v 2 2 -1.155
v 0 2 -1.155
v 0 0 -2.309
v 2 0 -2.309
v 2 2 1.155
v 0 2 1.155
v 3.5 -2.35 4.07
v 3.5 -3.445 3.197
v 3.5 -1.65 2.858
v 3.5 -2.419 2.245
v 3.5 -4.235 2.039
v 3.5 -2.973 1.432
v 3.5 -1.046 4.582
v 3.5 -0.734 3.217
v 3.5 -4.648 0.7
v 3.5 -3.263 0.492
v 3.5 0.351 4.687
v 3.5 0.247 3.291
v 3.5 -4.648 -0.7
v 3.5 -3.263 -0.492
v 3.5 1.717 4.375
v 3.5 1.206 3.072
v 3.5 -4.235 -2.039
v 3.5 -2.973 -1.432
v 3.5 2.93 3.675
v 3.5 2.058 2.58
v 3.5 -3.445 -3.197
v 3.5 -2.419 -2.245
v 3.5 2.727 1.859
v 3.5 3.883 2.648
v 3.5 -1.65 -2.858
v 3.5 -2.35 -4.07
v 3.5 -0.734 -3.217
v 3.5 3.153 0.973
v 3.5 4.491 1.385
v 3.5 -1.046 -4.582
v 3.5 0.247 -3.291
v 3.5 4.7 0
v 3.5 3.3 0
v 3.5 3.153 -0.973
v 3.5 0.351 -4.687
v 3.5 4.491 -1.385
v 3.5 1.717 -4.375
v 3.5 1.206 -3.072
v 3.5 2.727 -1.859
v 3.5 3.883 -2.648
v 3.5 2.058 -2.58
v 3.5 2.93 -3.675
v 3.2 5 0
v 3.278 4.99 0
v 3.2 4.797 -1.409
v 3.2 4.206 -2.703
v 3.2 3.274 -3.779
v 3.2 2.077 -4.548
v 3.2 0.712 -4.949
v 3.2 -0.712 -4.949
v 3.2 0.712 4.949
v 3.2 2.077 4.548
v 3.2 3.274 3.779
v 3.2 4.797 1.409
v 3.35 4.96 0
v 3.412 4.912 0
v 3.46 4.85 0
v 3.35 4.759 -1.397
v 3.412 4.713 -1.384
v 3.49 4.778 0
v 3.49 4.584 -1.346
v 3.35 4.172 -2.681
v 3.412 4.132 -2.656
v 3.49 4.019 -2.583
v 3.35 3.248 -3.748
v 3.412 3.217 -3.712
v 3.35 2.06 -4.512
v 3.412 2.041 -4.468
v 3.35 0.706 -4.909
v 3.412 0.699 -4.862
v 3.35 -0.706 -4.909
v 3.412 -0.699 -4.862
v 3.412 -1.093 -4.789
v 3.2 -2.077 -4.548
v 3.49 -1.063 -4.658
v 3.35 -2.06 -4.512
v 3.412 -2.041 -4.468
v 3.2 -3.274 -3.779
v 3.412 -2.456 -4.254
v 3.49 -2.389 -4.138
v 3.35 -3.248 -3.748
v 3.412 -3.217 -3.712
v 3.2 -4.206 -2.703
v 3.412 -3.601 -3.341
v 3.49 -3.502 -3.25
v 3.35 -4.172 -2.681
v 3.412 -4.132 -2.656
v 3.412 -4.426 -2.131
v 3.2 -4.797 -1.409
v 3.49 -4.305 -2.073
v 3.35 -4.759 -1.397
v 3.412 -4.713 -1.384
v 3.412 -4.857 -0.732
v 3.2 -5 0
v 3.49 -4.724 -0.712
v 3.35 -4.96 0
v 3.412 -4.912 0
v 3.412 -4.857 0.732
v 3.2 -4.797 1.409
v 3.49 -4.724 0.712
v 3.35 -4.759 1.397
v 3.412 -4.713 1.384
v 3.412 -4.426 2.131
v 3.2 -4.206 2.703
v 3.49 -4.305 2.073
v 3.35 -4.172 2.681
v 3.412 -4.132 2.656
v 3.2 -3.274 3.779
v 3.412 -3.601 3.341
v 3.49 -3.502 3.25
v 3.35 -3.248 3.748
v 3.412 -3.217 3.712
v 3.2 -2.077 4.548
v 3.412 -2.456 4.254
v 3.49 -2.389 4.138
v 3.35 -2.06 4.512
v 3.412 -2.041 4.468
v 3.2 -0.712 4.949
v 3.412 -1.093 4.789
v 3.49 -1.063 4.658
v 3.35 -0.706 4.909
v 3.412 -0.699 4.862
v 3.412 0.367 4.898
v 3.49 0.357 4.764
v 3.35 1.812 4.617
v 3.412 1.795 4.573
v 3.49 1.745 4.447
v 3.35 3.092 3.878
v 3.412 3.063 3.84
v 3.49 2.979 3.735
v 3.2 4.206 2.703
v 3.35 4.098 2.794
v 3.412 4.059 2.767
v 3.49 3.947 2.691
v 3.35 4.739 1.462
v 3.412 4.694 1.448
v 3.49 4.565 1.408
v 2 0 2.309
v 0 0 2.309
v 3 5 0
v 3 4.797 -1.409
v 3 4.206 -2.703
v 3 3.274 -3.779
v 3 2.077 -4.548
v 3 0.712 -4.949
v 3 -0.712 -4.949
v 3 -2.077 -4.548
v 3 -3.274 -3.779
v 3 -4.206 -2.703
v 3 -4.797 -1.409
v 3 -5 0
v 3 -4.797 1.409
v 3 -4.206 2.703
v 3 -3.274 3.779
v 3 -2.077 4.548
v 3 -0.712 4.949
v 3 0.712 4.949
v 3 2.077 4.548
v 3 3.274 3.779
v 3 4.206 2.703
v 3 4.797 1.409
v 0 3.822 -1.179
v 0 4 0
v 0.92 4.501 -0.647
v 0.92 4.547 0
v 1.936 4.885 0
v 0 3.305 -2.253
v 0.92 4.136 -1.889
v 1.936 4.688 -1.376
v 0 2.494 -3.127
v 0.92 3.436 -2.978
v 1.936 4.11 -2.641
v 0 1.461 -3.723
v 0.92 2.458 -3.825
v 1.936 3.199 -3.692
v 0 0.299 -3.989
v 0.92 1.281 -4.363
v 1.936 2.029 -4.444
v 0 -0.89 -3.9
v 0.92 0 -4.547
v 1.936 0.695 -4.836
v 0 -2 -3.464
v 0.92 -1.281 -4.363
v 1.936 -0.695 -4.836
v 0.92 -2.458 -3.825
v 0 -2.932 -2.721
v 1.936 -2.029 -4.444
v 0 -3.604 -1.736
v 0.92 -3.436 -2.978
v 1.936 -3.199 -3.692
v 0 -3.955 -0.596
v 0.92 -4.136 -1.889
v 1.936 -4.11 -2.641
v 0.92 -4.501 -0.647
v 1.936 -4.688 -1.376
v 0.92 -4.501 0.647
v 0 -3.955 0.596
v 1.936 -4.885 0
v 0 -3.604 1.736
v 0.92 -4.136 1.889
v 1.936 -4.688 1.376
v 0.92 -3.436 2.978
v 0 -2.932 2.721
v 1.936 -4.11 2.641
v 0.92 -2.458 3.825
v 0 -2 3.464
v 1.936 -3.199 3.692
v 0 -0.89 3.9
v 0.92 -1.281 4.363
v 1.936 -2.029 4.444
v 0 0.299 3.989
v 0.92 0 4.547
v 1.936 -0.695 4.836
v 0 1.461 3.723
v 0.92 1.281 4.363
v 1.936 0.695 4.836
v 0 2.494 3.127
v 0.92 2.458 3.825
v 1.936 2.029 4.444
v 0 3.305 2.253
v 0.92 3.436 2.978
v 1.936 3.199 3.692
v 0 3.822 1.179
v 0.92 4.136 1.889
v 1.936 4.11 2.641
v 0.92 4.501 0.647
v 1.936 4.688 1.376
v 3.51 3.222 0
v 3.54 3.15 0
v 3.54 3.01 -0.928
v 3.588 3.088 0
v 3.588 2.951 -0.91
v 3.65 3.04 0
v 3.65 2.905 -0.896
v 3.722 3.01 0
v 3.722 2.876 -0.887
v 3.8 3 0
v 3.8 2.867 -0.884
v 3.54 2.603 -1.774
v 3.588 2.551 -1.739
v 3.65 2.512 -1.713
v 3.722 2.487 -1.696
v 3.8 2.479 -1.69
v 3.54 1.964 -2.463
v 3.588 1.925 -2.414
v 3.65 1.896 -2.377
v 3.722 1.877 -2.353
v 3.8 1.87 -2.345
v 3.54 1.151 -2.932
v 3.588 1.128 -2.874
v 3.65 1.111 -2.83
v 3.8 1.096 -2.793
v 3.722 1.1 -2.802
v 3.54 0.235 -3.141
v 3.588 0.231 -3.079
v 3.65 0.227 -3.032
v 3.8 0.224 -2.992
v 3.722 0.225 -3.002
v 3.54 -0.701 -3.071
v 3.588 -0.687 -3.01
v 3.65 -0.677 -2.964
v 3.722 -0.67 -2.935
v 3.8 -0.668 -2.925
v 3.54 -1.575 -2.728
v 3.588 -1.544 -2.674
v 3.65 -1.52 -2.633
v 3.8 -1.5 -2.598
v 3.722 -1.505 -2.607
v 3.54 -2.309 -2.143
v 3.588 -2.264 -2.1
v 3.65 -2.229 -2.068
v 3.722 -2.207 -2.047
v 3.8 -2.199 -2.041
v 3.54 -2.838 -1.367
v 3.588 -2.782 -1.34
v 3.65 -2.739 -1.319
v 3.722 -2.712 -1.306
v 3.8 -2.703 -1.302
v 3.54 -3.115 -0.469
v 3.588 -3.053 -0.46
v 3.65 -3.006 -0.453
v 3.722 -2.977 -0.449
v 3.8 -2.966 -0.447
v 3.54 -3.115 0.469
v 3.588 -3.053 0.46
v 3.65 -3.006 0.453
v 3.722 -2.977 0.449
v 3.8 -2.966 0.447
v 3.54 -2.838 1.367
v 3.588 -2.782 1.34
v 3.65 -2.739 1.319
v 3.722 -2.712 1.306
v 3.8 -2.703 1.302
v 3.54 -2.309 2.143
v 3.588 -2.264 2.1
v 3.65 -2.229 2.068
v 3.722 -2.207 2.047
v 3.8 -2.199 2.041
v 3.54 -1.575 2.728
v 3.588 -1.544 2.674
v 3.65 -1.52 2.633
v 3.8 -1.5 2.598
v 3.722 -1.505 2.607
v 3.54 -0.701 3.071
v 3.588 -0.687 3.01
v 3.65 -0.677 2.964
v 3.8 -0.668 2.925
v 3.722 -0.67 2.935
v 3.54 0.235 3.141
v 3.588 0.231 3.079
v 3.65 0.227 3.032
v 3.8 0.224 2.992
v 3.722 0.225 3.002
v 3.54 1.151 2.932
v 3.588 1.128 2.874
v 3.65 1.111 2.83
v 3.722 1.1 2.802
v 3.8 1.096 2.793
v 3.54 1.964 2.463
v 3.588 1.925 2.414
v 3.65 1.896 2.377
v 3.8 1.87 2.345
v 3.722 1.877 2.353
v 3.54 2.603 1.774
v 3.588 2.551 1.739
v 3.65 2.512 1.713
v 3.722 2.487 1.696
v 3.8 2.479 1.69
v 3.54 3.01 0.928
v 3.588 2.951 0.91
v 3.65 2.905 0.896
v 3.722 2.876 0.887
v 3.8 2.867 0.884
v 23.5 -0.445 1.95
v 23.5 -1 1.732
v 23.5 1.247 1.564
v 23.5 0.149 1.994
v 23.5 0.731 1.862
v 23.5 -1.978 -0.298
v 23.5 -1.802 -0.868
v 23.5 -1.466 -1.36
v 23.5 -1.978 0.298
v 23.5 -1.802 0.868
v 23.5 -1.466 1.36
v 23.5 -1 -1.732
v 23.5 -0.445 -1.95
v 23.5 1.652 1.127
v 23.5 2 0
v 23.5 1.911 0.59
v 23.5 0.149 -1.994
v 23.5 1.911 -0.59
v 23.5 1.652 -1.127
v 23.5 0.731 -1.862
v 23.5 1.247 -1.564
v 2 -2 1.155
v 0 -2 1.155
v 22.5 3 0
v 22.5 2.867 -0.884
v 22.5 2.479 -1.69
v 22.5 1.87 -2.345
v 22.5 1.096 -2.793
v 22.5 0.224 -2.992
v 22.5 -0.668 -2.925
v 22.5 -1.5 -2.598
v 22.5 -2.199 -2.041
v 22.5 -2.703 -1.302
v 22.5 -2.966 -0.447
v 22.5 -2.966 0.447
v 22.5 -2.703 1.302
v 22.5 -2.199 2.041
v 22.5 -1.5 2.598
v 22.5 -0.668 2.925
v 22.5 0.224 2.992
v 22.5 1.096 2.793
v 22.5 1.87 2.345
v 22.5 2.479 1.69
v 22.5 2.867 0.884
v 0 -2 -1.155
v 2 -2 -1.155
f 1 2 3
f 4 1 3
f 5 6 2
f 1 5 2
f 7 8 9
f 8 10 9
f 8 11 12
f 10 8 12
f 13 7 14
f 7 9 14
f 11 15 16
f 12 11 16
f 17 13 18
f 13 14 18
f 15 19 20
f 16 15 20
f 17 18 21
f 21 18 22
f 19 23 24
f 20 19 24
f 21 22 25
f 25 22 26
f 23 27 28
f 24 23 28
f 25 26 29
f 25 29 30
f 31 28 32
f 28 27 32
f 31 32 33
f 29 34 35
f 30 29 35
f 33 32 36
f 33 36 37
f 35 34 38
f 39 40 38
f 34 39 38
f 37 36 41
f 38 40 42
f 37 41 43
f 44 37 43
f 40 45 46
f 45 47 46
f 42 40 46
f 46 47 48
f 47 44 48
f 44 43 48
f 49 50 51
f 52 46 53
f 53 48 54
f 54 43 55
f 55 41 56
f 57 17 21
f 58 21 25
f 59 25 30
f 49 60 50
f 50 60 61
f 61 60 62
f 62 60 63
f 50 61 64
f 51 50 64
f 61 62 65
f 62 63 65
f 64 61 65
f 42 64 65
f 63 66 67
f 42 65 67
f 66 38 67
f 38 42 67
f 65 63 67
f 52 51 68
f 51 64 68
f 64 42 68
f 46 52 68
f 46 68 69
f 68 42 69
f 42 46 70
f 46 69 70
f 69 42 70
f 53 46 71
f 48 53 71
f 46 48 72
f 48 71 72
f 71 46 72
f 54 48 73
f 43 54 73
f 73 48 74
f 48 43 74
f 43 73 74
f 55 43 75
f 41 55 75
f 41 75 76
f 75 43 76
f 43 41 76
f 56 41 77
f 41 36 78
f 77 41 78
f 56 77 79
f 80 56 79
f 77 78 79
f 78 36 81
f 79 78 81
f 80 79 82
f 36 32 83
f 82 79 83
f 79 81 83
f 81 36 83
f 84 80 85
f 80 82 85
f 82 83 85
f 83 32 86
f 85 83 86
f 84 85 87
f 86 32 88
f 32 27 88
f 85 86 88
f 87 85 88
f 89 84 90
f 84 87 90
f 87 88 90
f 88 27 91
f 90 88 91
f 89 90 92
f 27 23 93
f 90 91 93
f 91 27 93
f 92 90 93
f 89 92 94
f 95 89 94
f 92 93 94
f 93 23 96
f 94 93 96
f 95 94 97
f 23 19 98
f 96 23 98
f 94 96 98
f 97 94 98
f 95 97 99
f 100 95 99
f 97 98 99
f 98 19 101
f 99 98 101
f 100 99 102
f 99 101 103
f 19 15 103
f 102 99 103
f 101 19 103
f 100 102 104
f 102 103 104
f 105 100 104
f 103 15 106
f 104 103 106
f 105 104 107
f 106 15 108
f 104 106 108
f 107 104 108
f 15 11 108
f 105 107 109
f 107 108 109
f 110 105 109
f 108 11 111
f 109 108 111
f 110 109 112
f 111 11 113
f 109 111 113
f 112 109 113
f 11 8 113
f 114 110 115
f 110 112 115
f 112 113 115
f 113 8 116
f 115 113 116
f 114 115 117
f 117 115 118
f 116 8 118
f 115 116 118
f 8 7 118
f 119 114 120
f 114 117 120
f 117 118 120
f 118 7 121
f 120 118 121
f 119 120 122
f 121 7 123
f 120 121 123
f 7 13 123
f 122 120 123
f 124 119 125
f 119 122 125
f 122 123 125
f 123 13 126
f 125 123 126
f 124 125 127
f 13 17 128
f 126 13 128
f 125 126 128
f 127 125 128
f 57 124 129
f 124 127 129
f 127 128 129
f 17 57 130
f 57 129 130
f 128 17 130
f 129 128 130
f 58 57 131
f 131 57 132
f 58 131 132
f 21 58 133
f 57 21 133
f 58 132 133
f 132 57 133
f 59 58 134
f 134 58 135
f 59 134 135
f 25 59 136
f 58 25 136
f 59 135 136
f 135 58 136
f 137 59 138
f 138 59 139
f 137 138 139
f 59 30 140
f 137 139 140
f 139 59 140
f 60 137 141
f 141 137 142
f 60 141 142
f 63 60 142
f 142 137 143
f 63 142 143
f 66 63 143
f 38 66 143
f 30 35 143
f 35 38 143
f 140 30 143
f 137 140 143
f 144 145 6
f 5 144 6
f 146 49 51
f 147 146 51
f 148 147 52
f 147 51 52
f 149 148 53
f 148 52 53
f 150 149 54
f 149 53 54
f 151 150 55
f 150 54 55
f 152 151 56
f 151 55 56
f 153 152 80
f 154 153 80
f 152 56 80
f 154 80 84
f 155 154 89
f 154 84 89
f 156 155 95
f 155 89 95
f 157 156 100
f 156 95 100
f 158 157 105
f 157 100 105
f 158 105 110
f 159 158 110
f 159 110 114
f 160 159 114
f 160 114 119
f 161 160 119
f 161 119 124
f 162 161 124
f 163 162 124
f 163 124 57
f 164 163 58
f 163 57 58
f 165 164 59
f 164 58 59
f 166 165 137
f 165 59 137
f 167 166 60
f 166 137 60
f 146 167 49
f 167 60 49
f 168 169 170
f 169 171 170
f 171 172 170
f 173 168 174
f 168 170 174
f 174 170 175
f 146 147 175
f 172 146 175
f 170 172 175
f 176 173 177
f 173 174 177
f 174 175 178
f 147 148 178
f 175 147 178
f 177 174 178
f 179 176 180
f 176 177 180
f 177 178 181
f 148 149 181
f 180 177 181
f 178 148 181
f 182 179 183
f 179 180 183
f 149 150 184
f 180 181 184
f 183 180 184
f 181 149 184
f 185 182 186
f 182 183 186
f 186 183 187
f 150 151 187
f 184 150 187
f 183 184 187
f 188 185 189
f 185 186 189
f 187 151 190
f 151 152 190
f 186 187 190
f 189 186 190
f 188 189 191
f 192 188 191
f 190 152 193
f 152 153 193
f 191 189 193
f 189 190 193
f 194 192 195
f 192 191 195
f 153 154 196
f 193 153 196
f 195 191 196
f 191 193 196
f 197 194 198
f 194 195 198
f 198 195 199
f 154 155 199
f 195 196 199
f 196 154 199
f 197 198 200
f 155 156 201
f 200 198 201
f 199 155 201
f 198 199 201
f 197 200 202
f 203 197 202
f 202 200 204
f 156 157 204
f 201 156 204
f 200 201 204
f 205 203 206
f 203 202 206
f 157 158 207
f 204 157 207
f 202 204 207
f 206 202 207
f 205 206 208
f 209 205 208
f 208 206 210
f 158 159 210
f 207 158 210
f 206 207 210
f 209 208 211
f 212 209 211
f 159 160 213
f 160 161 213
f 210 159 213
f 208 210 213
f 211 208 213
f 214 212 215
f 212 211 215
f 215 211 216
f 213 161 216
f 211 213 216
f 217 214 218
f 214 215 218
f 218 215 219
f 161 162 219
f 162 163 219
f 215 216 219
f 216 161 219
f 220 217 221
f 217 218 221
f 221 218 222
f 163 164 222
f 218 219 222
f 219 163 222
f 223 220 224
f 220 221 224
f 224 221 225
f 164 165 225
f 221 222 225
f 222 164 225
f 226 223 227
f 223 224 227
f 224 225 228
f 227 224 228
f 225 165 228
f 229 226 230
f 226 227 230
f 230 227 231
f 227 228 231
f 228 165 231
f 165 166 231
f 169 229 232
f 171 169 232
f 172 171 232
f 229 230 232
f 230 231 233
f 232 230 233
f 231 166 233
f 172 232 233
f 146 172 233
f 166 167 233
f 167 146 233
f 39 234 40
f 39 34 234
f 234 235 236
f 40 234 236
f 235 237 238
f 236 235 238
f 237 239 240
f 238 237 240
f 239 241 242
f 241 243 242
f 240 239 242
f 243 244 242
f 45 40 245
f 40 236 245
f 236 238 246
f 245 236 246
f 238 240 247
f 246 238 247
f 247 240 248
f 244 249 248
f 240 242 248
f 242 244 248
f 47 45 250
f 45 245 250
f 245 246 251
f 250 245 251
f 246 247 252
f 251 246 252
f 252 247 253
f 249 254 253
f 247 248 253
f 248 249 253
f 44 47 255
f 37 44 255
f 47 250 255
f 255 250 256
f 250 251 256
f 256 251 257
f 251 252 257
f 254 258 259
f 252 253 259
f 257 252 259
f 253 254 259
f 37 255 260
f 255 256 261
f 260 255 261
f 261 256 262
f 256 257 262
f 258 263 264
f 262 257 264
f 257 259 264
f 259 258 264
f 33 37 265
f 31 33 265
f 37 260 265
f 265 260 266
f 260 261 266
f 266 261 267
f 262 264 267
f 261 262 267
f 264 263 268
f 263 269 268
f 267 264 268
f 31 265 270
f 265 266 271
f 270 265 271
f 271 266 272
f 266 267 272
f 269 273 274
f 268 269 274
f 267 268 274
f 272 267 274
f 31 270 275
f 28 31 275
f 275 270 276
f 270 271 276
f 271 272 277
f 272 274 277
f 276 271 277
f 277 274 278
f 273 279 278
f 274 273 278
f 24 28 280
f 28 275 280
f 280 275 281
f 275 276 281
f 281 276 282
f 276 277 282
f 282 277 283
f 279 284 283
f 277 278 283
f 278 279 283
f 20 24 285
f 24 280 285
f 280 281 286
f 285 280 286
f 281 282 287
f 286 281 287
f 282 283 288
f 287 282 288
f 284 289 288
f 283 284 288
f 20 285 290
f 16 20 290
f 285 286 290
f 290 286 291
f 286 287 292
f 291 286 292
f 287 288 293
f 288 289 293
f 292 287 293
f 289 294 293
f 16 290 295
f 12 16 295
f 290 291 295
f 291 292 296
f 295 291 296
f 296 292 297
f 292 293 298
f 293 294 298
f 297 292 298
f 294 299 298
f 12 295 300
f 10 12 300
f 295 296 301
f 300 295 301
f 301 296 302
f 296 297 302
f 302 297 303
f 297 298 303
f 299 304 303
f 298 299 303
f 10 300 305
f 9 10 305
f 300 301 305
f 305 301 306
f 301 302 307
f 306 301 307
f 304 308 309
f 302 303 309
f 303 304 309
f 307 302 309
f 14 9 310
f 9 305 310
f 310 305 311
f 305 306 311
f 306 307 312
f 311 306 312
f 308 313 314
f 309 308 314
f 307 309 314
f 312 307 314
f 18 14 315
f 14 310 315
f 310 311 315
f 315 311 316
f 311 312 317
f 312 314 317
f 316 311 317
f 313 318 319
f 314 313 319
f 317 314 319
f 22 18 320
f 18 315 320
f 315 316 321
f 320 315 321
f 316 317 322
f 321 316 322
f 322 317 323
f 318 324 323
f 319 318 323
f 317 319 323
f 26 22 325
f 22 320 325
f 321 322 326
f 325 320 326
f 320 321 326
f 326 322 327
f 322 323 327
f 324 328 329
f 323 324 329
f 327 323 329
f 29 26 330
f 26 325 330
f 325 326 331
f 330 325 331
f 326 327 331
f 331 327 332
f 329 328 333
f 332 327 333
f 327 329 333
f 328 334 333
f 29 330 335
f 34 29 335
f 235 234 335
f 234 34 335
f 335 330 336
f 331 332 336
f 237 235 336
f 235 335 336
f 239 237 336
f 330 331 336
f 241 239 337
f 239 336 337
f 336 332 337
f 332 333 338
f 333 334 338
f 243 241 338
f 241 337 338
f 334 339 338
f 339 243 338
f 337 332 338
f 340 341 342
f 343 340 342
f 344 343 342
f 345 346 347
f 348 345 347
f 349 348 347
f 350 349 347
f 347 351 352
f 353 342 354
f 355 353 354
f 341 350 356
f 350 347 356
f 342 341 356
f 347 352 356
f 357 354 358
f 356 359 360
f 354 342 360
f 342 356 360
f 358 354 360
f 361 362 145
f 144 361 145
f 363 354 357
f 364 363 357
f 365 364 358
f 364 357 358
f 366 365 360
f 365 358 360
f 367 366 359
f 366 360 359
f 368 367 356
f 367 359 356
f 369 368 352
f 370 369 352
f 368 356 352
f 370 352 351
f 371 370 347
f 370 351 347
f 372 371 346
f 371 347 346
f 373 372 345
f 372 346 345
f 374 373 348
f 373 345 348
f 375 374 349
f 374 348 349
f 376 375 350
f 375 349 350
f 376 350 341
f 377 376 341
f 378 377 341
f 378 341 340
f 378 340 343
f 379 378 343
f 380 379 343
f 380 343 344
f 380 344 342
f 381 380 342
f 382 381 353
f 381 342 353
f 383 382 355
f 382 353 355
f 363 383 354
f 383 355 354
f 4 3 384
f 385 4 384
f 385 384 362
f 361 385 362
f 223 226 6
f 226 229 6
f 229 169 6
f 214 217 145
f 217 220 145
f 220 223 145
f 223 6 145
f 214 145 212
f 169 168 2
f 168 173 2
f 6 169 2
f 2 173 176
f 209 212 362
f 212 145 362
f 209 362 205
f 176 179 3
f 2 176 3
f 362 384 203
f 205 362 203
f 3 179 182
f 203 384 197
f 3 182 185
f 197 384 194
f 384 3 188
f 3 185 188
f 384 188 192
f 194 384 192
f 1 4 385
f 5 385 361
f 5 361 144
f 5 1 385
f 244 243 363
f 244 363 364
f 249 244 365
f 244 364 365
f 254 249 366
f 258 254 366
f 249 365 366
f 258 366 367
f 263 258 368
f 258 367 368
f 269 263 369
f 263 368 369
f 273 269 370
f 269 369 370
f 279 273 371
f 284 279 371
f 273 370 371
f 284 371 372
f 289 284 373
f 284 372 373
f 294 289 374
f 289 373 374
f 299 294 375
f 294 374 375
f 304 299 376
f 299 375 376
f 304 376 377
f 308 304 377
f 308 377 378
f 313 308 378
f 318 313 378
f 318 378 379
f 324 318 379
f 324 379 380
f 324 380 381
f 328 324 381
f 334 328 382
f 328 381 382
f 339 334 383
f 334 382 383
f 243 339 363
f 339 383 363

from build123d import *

# Parameters (mm, degrees)
CUT_EXTRUDE_1_DEPTH = 2
FILLET_1_R          = 0.3
CHAMFER_1_SIZE      = 1


with BuildPart() as part:
    # Эскиз1 → Повернуть1 (revolve)
    with BuildSketch(Plane.XY):
        with BuildLine():
            Line((0, 0), (0, 4))
            ThreePointArc((0, 4), (1.41886117, 4.74341649), (3, 5))
            Line((3, 5), (3.5, 5))
            Line((3.5, 5), (3.5, 3))
            Line((3.5, 3), (23.5, 3))
            Line((23.5, 3), (23.5, 0))
            Line((23.5, 0), (0, 0))
        make_face()
    revolve(axis=Axis((23.5, 0, 0), (-1, 0, 0)))

    # Эскиз2 → Вырез-Вытянуть1 (cut)
    with BuildSketch(Plane.ZY):
        Polygon((1.154700538, 2), (-1.154700538, 2), (-2.309401077, 0), (-1.154700538, -2), (1.154700538, -2), (2.309401077, 0), align=None)
    extrude(amount=-CUT_EXTRUDE_1_DEPTH, mode=Mode.SUBTRACT)

    # Скругление1
    fillet_1_edges = [part.edges().sort_by_distance(p)[0] for p in [
        (3.5, -3, 0),
        (3.5, -5, 0),
    ]]
    fillet(fillet_1_edges, radius=FILLET_1_R)

    # Фаска1
    chamfer_1_edges = [part.edges().sort_by_distance(p)[0] for p in [
        (23.5, -3, 0),
    ]]
    chamfer(chamfer_1_edges, length=CHAMFER_1_SIZE)


solid = part.part
